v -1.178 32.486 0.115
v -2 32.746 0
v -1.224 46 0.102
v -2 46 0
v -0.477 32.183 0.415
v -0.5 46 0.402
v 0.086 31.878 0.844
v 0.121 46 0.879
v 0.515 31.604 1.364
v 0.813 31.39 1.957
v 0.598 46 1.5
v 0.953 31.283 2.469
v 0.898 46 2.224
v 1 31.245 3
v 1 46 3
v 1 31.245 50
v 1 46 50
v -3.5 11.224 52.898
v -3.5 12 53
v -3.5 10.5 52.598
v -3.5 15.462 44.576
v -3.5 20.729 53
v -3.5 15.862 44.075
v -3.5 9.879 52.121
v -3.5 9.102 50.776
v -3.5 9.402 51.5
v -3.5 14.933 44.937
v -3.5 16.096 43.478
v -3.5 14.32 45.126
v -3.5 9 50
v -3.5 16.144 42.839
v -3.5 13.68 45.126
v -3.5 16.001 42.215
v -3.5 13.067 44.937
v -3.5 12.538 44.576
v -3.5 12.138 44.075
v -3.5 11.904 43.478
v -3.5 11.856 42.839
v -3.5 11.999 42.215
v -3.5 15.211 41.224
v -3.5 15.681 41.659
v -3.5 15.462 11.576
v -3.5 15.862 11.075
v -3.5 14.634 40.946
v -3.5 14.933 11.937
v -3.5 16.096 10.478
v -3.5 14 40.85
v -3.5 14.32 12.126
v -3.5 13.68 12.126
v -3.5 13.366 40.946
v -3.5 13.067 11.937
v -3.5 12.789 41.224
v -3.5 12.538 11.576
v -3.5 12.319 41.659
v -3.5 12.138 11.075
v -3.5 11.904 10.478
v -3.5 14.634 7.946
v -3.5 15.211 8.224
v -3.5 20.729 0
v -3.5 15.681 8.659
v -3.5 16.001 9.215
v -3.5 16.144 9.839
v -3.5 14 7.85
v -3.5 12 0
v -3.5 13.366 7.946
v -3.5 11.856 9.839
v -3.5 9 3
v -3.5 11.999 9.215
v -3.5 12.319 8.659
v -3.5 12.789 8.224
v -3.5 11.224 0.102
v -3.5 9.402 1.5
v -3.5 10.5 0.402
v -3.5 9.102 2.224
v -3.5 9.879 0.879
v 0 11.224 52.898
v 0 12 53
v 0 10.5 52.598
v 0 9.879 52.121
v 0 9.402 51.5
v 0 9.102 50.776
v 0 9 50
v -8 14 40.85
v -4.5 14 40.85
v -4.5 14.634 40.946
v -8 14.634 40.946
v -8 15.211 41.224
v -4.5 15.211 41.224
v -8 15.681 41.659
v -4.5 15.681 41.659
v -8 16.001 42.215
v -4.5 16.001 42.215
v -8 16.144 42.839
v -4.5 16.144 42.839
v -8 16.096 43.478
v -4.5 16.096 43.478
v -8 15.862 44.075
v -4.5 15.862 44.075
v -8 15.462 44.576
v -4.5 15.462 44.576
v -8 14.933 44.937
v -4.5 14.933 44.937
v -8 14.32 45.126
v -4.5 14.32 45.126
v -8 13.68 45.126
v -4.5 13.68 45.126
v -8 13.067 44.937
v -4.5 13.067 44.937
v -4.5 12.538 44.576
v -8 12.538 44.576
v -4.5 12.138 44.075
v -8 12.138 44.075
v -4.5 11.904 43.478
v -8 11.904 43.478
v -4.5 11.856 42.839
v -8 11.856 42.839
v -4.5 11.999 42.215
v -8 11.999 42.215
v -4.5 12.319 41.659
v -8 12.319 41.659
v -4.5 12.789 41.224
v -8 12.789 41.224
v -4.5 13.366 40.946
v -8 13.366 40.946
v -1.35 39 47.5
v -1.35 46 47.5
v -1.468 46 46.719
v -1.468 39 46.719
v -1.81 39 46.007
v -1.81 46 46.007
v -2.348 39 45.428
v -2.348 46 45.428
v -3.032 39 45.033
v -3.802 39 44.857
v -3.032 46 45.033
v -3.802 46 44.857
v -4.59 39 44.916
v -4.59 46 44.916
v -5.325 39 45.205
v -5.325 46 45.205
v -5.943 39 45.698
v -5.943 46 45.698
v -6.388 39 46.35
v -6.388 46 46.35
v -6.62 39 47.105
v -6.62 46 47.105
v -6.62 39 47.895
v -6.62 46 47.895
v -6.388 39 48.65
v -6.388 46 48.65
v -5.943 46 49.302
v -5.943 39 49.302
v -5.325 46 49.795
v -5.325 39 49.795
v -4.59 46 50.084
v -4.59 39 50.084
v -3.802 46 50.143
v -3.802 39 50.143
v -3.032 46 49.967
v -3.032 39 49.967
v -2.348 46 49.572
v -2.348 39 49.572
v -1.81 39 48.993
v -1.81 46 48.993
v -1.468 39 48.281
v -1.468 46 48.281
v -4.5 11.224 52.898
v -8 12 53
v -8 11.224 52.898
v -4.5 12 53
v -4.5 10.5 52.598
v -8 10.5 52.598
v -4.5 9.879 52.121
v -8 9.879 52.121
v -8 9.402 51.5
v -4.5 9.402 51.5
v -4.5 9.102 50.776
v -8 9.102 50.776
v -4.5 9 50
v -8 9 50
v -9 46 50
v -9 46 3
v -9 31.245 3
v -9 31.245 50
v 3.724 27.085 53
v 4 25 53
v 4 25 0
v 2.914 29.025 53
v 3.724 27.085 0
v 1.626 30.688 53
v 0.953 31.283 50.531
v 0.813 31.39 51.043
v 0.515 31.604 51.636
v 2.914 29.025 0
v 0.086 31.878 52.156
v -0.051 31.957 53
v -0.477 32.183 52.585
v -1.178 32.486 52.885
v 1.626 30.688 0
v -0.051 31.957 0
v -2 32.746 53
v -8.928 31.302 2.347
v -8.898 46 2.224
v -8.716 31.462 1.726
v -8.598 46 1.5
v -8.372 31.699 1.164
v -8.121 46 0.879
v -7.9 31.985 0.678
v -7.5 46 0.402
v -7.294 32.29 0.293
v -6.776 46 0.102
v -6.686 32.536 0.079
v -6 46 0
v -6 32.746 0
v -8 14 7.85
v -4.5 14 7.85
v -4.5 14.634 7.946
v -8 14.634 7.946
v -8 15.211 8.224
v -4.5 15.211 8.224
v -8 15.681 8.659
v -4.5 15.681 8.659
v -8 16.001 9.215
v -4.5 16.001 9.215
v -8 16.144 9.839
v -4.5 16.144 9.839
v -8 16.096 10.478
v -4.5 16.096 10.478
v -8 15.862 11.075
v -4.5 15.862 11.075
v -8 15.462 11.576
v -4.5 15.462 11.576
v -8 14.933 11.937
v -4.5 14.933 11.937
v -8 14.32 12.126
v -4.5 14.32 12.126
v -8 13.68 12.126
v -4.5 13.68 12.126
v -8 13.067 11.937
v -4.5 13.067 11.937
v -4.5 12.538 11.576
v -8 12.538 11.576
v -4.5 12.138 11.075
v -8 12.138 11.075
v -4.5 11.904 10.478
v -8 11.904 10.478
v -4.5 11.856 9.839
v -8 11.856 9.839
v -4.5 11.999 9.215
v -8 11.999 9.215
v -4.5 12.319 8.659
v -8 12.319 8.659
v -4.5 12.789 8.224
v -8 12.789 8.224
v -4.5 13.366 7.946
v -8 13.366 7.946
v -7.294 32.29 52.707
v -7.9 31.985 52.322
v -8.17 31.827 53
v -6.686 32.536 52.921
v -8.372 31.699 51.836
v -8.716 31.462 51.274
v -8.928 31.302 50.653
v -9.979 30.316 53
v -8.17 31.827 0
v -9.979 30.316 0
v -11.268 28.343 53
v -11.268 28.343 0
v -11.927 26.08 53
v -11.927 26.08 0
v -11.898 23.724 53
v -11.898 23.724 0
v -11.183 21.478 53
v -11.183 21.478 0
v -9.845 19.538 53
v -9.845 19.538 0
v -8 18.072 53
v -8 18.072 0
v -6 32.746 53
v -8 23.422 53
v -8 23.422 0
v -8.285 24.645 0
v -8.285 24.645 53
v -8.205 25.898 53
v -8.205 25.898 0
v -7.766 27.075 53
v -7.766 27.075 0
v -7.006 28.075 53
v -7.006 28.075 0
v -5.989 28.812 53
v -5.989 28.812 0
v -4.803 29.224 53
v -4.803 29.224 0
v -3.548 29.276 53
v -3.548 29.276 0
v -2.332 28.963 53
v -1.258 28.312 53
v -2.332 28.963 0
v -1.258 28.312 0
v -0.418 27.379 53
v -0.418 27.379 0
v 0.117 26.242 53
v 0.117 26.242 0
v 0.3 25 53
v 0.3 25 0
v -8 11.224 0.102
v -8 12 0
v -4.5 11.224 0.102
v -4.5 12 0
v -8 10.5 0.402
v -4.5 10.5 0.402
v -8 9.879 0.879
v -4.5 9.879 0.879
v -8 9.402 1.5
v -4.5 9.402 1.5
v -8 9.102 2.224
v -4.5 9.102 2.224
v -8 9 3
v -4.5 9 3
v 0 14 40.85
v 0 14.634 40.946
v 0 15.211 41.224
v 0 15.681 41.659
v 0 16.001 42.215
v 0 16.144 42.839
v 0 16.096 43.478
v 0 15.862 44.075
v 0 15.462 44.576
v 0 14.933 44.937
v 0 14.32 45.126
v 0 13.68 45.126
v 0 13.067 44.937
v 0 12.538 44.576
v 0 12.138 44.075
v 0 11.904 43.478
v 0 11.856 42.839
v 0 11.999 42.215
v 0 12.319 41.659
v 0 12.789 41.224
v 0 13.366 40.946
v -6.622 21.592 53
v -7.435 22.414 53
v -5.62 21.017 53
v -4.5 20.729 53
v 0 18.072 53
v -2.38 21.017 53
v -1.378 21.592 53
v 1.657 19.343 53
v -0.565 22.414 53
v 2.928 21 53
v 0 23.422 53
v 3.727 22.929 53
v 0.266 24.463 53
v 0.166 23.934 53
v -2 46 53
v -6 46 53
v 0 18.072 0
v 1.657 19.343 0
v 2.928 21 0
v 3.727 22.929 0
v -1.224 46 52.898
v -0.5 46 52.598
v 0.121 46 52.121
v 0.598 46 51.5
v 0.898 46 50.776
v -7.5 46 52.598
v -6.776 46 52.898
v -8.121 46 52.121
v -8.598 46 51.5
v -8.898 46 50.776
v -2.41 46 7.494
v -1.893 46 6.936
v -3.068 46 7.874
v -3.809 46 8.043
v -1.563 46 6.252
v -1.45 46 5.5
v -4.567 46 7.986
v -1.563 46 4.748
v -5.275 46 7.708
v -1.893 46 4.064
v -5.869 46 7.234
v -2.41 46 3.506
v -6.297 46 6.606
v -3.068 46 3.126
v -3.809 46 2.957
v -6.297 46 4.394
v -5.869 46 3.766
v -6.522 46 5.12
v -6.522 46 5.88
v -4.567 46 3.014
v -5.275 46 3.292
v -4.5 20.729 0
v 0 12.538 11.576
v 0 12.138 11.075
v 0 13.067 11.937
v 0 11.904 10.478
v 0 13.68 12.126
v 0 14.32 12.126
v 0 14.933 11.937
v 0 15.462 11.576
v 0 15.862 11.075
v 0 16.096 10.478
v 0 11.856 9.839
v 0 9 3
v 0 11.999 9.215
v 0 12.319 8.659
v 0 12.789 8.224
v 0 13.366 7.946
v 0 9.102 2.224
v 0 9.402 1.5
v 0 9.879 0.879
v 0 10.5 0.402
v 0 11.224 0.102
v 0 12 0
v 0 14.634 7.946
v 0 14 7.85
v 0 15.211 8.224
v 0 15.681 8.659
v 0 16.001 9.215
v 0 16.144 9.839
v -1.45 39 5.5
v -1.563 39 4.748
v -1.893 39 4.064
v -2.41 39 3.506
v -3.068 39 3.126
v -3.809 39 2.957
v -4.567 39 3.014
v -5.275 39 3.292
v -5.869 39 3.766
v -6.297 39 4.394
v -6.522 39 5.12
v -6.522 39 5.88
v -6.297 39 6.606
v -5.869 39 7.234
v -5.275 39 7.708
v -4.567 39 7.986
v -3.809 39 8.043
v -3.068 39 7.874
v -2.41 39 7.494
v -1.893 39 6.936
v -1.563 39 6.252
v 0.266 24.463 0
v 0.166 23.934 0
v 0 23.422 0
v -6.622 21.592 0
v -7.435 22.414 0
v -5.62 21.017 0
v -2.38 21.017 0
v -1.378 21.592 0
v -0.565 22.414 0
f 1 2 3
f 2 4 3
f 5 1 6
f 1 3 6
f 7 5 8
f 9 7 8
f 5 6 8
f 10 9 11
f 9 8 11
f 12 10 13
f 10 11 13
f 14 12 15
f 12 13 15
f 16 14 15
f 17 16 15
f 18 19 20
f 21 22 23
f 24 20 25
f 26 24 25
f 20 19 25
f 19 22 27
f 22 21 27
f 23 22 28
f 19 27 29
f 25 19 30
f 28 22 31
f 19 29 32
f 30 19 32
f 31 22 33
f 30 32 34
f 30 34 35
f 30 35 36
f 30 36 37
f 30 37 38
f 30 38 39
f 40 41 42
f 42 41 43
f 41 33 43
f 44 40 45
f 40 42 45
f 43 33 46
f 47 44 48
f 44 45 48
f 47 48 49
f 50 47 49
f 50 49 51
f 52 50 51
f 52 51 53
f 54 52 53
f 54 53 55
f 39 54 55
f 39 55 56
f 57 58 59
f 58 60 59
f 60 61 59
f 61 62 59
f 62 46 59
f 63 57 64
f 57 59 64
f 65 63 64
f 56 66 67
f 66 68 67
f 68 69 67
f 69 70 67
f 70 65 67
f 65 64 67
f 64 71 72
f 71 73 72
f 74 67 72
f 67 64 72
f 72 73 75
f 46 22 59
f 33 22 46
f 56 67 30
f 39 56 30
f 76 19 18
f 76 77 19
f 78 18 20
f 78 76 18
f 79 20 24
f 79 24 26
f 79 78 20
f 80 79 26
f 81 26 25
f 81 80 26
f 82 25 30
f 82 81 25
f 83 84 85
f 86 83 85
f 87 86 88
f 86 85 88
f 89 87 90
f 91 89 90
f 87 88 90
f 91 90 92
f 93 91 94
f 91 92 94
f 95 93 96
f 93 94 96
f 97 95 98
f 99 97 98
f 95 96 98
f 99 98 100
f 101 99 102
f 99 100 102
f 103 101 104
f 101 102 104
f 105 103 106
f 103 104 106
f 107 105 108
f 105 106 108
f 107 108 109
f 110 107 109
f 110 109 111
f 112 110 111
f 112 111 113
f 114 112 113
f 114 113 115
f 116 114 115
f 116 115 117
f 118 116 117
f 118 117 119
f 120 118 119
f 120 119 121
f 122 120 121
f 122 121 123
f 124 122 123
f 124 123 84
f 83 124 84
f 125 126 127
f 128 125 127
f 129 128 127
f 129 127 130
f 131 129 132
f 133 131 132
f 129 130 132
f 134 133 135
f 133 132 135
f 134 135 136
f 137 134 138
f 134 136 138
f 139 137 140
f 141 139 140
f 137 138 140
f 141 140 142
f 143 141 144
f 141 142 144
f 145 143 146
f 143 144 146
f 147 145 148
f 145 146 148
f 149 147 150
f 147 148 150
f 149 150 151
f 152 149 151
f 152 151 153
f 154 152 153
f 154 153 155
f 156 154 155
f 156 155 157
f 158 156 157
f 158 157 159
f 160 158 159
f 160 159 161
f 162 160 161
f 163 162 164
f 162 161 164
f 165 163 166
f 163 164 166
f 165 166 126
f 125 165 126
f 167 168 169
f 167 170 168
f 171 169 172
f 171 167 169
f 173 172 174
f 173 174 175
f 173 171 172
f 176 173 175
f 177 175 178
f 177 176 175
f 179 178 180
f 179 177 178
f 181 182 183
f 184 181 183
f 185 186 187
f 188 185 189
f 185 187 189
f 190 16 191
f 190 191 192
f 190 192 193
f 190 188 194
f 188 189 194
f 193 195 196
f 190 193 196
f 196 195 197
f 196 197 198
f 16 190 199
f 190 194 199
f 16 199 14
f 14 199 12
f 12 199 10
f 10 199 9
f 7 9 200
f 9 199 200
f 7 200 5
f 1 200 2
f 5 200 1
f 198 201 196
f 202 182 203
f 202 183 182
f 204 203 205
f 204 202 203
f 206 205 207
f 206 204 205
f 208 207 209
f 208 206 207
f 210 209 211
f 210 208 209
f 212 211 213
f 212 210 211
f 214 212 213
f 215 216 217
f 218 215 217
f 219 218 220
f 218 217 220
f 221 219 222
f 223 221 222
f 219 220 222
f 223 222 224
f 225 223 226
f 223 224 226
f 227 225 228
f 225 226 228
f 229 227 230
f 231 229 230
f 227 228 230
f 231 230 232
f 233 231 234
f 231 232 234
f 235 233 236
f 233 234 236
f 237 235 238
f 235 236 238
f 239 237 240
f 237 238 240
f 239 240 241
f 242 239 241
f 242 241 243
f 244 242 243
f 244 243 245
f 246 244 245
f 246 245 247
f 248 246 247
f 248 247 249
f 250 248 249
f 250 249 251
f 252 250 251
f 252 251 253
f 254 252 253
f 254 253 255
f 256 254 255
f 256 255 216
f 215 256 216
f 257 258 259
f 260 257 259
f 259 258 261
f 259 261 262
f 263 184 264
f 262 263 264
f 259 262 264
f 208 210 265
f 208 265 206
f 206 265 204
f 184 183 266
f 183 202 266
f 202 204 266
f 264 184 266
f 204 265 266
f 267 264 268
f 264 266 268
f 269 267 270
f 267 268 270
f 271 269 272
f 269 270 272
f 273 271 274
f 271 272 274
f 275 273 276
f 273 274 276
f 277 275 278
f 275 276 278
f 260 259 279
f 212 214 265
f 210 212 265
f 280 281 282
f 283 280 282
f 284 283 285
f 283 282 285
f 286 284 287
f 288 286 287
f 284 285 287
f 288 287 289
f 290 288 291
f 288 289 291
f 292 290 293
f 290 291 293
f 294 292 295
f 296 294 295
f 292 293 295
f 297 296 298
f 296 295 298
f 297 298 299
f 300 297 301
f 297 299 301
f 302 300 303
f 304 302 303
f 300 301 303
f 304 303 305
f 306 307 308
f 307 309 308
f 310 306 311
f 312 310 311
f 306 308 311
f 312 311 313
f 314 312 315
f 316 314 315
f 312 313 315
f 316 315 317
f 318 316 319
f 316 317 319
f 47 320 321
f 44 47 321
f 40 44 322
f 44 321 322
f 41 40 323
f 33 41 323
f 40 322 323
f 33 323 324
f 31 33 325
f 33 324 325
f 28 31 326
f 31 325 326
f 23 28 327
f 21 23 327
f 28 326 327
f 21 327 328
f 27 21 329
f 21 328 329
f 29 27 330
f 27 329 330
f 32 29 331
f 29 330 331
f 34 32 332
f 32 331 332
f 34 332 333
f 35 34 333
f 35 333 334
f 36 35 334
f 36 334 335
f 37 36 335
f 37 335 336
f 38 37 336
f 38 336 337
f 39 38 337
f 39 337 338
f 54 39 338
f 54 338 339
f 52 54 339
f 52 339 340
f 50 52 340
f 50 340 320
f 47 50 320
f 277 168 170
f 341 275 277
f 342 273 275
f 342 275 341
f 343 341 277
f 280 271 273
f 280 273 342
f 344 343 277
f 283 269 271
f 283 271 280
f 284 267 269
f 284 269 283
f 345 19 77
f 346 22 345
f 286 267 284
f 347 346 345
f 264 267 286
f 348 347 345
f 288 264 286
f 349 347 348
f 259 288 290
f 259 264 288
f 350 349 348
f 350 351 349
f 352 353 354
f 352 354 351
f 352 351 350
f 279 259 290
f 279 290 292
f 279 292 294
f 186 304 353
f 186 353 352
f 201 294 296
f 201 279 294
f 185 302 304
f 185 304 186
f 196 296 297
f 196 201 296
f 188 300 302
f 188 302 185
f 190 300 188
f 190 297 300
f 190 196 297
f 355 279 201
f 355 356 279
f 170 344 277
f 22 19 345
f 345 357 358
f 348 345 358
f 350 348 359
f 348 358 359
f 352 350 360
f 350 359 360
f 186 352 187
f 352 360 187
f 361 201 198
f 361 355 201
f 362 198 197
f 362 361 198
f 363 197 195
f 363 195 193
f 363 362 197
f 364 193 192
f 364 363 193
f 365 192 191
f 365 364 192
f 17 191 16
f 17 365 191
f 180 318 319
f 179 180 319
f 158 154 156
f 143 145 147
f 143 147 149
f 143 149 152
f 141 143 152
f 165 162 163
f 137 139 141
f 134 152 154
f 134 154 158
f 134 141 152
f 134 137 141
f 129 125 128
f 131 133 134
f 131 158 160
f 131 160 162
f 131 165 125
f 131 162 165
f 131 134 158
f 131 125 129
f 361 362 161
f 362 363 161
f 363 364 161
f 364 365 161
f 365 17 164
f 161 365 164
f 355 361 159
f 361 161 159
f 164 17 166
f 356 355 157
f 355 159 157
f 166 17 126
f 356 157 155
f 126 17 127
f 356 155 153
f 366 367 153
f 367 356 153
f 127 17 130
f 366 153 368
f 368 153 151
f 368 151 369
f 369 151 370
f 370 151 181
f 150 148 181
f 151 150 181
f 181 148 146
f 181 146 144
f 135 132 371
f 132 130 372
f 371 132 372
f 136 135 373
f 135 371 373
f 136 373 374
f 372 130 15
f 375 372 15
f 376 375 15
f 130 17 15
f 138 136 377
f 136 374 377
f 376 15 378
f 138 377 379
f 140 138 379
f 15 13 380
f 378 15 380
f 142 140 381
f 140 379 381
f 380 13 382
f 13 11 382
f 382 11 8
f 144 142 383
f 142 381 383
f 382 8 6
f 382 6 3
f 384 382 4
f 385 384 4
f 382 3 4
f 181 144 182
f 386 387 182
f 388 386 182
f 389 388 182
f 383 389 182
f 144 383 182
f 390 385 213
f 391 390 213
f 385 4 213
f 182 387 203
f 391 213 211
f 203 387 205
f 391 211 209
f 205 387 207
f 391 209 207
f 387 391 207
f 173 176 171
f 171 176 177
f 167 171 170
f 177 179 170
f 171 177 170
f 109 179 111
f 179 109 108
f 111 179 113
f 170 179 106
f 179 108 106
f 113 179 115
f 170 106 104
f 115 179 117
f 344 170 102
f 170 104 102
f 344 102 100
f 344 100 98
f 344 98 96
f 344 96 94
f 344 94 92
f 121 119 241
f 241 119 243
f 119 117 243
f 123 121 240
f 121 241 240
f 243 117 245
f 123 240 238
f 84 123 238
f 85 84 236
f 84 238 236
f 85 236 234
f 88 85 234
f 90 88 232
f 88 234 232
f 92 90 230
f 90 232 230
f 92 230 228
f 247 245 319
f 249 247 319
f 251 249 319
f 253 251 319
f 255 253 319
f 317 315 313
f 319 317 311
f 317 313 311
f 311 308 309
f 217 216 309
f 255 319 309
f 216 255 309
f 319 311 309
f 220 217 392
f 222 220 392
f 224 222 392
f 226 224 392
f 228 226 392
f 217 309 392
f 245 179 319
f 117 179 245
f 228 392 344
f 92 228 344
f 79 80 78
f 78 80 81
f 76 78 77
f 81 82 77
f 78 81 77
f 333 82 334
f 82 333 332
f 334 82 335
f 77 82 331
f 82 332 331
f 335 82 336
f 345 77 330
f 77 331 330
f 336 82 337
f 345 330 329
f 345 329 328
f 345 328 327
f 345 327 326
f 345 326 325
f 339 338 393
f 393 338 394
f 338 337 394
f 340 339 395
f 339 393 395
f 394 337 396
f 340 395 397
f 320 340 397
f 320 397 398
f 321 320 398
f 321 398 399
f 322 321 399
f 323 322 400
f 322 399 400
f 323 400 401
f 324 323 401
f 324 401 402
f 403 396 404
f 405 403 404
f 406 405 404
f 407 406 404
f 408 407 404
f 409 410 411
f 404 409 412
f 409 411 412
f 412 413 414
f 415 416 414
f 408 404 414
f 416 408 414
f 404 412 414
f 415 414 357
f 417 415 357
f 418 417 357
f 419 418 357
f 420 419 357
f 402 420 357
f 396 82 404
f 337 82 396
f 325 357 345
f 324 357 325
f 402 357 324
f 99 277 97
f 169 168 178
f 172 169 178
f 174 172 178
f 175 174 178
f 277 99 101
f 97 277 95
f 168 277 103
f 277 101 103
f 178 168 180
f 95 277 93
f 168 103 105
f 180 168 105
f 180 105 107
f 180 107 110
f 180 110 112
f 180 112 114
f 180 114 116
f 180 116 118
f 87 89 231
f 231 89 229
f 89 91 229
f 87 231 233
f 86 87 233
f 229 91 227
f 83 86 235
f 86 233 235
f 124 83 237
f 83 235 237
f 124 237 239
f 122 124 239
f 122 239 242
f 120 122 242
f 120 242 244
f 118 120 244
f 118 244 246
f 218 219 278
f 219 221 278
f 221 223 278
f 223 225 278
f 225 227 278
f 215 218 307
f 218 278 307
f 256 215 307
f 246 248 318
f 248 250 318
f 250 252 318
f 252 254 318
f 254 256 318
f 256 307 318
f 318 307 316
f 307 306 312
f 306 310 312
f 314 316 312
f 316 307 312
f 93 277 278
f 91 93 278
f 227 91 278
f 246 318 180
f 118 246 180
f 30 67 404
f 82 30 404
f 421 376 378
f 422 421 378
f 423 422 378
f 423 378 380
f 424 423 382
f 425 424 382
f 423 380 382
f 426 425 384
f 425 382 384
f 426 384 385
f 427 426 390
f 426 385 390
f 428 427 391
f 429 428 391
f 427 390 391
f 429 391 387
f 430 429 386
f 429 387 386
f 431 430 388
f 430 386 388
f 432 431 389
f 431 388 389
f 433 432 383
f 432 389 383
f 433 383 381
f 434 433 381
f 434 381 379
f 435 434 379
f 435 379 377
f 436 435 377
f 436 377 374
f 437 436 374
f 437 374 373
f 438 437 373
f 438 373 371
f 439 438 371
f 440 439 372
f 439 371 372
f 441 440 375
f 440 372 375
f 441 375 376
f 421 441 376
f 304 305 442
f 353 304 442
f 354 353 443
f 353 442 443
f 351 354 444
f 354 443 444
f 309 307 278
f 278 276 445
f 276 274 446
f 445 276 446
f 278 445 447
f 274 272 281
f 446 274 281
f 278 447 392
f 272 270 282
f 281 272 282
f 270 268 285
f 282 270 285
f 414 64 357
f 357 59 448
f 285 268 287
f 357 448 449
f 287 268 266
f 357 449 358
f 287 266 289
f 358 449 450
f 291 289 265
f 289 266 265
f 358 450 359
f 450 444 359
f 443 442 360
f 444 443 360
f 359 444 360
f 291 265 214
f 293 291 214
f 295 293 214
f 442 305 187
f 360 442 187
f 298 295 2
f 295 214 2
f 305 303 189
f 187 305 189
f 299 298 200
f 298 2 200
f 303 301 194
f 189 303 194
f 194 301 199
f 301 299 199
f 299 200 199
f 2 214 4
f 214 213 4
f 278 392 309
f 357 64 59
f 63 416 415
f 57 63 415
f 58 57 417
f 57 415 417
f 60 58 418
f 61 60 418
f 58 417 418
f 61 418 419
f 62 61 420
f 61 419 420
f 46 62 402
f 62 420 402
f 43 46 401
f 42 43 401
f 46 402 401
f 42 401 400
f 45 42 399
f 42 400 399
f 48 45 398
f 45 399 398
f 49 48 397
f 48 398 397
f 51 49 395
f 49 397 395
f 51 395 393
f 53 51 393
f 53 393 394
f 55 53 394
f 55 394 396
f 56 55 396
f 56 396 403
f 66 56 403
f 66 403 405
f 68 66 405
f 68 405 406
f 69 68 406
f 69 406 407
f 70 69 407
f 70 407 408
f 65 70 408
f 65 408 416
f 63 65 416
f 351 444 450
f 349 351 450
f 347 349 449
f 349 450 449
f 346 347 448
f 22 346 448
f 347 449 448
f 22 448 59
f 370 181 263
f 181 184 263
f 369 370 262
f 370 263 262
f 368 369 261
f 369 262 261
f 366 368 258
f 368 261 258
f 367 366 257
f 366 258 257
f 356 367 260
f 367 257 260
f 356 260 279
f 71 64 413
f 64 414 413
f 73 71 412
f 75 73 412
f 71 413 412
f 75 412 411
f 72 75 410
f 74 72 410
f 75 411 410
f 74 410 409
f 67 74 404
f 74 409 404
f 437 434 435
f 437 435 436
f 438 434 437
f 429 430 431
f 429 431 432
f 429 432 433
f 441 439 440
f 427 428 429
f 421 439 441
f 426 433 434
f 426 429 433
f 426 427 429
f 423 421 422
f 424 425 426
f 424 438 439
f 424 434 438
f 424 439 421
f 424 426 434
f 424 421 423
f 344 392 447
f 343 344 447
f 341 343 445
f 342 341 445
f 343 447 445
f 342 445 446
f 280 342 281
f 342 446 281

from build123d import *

# Parameters (mm, degrees)
BOSS_EXTRUDE1_DEPTH = 53
SKETCH2_R           = 2.15
CUT_EXTRUDE1_DEPTH  = 40
SKETCH3_R           = 2.55
SKETCH3_R_2         = 2.65
CUT_EXTRUDE2_DEPTH  = 7
FILLET1_R           = 3


with BuildPart() as part:
    # Sketch1 → Boss-Extrude1 (new body)
    with BuildSketch(Plane.XY):
        with BuildLine():
            Line((-9, 45.999997998), (-9, 31.244997998))
            ThreePointArc((-9, 31.244997998), (-4, 33), (1, 31.244997998))
            Line((1, 31.244997998), (1, 45.999997998))
            Line((1, 45.999997998), (-9, 45.999997998))
        make_face()
        with BuildLine():
            ThreePointArc((1, 31.244997998), (-4, 33), (-9, 31.244997998))
            Line((-9, 31.244997998), (1, 31.244997998))
        make_face()
        with BuildLine():
            Line((-8, 18.07179677), (-8, 23.422026616))
            ThreePointArc((-8, 23.422026616), (-4.80311892, 29.224334267), (0.3, 25))
            ThreePointArc((0.3, 25), (0.224334267, 24.19688108), (0, 23.422026616))
            Line((0, 23.422026616), (0, 18.07179677))
            ThreePointArc((0, 18.07179677), (2.92820323, 21), (4, 25))
            ThreePointArc((4, 25), (3.211102551, 28.464101615), (1, 31.244997998))
            Line((1, 31.244997998), (-9, 31.244997998))
            ThreePointArc((-9, 31.244997998), (-11.977048806, 24.394448725), (-8, 18.07179677))
        make_face()
        with BuildLine():
            ThreePointArc((0, 23.422026616), (-1.377907145, 21.591975784), (-3.5, 20.729168699))
            Line((-3.5, 20.729168699), (-3.5, 17.015640289))
            ThreePointArc((-3.5, 17.015640289), (-1.688860318, 17.341107562), (0, 18.07179677))
            Line((0, 18.07179677), (0, 23.422026616))
        make_face()
        with BuildLine():
            ThreePointArc((-4.5, 20.729168699), (-6.622092855, 21.591975784), (-8, 23.422026616))
            Line((-8, 23.422026616), (-8, 18.07179677))
            ThreePointArc((-8, 18.07179677), (-6.311139682, 17.341107562), (-4.5, 17.015640289))
            Line((-4.5, 17.015640289), (-4.5, 20.729168699))
        make_face()
        with BuildLine():
            ThreePointArc((-4.5, 17.015640289), (-6.311139682, 17.341107562), (-8, 18.07179677))
            Line((-8, 18.07179677), (-8, 9))
            Line((-8, 9), (-4.5, 9))
            Line((-4.5, 9), (-4.5, 17.015640289))
        make_face()
        with BuildLine():
            ThreePointArc((0, 18.07179677), (-1.688860318, 17.341107562), (-3.5, 17.015640289))
            Line((-3.5, 17.015640289), (-3.5, 9))
            Line((-3.5, 9), (0, 9))
            Line((0, 9), (0, 18.07179677))
        make_face()
    extrude(amount=BOSS_EXTRUDE1_DEPTH)

    # Sketch2 → Cut-Extrude1 (cut)
    with BuildSketch(Plane(origin=(0, 0, 0), x_dir=(0, 0, -1), z_dir=(1, 0, 0))):
        with Locations((-43, 14)):
            Circle(SKETCH2_R)
        with Locations((-10, 14)):
            Circle(SKETCH2_R)
    extrude(amount=-CUT_EXTRUDE1_DEPTH, mode=Mode.SUBTRACT)

    # Sketch3 → Cut-Extrude2 (cut)
    with BuildSketch(Plane(origin=(0, 45.999997998, 0), x_dir=(1, 0, 0), z_dir=(0, 1, 0))):
        with Locations((-4, -5.5)):
            Circle(SKETCH3_R)
        with Locations((-4, -47.5)):
            Circle(SKETCH3_R_2)
    extrude(amount=-CUT_EXTRUDE2_DEPTH, mode=Mode.SUBTRACT)

    # Fillet1
    fillet1_edges = [part.edges().sort_by_distance(p)[0] for p in [
        (1, 38.622497998, 0),
        (-1.75, 9, 0),
        (-6.25, 9, 0),
        (-9, 38.622497998, 0),
        (-6.25, 9, 53),
        (-1.75, 9, 53),
        (-9, 38.622497998, 53),
        (1, 38.622497998, 53),
    ]]
    fillet(fillet1_edges, radius=FILLET1_R)


solid = part.part
